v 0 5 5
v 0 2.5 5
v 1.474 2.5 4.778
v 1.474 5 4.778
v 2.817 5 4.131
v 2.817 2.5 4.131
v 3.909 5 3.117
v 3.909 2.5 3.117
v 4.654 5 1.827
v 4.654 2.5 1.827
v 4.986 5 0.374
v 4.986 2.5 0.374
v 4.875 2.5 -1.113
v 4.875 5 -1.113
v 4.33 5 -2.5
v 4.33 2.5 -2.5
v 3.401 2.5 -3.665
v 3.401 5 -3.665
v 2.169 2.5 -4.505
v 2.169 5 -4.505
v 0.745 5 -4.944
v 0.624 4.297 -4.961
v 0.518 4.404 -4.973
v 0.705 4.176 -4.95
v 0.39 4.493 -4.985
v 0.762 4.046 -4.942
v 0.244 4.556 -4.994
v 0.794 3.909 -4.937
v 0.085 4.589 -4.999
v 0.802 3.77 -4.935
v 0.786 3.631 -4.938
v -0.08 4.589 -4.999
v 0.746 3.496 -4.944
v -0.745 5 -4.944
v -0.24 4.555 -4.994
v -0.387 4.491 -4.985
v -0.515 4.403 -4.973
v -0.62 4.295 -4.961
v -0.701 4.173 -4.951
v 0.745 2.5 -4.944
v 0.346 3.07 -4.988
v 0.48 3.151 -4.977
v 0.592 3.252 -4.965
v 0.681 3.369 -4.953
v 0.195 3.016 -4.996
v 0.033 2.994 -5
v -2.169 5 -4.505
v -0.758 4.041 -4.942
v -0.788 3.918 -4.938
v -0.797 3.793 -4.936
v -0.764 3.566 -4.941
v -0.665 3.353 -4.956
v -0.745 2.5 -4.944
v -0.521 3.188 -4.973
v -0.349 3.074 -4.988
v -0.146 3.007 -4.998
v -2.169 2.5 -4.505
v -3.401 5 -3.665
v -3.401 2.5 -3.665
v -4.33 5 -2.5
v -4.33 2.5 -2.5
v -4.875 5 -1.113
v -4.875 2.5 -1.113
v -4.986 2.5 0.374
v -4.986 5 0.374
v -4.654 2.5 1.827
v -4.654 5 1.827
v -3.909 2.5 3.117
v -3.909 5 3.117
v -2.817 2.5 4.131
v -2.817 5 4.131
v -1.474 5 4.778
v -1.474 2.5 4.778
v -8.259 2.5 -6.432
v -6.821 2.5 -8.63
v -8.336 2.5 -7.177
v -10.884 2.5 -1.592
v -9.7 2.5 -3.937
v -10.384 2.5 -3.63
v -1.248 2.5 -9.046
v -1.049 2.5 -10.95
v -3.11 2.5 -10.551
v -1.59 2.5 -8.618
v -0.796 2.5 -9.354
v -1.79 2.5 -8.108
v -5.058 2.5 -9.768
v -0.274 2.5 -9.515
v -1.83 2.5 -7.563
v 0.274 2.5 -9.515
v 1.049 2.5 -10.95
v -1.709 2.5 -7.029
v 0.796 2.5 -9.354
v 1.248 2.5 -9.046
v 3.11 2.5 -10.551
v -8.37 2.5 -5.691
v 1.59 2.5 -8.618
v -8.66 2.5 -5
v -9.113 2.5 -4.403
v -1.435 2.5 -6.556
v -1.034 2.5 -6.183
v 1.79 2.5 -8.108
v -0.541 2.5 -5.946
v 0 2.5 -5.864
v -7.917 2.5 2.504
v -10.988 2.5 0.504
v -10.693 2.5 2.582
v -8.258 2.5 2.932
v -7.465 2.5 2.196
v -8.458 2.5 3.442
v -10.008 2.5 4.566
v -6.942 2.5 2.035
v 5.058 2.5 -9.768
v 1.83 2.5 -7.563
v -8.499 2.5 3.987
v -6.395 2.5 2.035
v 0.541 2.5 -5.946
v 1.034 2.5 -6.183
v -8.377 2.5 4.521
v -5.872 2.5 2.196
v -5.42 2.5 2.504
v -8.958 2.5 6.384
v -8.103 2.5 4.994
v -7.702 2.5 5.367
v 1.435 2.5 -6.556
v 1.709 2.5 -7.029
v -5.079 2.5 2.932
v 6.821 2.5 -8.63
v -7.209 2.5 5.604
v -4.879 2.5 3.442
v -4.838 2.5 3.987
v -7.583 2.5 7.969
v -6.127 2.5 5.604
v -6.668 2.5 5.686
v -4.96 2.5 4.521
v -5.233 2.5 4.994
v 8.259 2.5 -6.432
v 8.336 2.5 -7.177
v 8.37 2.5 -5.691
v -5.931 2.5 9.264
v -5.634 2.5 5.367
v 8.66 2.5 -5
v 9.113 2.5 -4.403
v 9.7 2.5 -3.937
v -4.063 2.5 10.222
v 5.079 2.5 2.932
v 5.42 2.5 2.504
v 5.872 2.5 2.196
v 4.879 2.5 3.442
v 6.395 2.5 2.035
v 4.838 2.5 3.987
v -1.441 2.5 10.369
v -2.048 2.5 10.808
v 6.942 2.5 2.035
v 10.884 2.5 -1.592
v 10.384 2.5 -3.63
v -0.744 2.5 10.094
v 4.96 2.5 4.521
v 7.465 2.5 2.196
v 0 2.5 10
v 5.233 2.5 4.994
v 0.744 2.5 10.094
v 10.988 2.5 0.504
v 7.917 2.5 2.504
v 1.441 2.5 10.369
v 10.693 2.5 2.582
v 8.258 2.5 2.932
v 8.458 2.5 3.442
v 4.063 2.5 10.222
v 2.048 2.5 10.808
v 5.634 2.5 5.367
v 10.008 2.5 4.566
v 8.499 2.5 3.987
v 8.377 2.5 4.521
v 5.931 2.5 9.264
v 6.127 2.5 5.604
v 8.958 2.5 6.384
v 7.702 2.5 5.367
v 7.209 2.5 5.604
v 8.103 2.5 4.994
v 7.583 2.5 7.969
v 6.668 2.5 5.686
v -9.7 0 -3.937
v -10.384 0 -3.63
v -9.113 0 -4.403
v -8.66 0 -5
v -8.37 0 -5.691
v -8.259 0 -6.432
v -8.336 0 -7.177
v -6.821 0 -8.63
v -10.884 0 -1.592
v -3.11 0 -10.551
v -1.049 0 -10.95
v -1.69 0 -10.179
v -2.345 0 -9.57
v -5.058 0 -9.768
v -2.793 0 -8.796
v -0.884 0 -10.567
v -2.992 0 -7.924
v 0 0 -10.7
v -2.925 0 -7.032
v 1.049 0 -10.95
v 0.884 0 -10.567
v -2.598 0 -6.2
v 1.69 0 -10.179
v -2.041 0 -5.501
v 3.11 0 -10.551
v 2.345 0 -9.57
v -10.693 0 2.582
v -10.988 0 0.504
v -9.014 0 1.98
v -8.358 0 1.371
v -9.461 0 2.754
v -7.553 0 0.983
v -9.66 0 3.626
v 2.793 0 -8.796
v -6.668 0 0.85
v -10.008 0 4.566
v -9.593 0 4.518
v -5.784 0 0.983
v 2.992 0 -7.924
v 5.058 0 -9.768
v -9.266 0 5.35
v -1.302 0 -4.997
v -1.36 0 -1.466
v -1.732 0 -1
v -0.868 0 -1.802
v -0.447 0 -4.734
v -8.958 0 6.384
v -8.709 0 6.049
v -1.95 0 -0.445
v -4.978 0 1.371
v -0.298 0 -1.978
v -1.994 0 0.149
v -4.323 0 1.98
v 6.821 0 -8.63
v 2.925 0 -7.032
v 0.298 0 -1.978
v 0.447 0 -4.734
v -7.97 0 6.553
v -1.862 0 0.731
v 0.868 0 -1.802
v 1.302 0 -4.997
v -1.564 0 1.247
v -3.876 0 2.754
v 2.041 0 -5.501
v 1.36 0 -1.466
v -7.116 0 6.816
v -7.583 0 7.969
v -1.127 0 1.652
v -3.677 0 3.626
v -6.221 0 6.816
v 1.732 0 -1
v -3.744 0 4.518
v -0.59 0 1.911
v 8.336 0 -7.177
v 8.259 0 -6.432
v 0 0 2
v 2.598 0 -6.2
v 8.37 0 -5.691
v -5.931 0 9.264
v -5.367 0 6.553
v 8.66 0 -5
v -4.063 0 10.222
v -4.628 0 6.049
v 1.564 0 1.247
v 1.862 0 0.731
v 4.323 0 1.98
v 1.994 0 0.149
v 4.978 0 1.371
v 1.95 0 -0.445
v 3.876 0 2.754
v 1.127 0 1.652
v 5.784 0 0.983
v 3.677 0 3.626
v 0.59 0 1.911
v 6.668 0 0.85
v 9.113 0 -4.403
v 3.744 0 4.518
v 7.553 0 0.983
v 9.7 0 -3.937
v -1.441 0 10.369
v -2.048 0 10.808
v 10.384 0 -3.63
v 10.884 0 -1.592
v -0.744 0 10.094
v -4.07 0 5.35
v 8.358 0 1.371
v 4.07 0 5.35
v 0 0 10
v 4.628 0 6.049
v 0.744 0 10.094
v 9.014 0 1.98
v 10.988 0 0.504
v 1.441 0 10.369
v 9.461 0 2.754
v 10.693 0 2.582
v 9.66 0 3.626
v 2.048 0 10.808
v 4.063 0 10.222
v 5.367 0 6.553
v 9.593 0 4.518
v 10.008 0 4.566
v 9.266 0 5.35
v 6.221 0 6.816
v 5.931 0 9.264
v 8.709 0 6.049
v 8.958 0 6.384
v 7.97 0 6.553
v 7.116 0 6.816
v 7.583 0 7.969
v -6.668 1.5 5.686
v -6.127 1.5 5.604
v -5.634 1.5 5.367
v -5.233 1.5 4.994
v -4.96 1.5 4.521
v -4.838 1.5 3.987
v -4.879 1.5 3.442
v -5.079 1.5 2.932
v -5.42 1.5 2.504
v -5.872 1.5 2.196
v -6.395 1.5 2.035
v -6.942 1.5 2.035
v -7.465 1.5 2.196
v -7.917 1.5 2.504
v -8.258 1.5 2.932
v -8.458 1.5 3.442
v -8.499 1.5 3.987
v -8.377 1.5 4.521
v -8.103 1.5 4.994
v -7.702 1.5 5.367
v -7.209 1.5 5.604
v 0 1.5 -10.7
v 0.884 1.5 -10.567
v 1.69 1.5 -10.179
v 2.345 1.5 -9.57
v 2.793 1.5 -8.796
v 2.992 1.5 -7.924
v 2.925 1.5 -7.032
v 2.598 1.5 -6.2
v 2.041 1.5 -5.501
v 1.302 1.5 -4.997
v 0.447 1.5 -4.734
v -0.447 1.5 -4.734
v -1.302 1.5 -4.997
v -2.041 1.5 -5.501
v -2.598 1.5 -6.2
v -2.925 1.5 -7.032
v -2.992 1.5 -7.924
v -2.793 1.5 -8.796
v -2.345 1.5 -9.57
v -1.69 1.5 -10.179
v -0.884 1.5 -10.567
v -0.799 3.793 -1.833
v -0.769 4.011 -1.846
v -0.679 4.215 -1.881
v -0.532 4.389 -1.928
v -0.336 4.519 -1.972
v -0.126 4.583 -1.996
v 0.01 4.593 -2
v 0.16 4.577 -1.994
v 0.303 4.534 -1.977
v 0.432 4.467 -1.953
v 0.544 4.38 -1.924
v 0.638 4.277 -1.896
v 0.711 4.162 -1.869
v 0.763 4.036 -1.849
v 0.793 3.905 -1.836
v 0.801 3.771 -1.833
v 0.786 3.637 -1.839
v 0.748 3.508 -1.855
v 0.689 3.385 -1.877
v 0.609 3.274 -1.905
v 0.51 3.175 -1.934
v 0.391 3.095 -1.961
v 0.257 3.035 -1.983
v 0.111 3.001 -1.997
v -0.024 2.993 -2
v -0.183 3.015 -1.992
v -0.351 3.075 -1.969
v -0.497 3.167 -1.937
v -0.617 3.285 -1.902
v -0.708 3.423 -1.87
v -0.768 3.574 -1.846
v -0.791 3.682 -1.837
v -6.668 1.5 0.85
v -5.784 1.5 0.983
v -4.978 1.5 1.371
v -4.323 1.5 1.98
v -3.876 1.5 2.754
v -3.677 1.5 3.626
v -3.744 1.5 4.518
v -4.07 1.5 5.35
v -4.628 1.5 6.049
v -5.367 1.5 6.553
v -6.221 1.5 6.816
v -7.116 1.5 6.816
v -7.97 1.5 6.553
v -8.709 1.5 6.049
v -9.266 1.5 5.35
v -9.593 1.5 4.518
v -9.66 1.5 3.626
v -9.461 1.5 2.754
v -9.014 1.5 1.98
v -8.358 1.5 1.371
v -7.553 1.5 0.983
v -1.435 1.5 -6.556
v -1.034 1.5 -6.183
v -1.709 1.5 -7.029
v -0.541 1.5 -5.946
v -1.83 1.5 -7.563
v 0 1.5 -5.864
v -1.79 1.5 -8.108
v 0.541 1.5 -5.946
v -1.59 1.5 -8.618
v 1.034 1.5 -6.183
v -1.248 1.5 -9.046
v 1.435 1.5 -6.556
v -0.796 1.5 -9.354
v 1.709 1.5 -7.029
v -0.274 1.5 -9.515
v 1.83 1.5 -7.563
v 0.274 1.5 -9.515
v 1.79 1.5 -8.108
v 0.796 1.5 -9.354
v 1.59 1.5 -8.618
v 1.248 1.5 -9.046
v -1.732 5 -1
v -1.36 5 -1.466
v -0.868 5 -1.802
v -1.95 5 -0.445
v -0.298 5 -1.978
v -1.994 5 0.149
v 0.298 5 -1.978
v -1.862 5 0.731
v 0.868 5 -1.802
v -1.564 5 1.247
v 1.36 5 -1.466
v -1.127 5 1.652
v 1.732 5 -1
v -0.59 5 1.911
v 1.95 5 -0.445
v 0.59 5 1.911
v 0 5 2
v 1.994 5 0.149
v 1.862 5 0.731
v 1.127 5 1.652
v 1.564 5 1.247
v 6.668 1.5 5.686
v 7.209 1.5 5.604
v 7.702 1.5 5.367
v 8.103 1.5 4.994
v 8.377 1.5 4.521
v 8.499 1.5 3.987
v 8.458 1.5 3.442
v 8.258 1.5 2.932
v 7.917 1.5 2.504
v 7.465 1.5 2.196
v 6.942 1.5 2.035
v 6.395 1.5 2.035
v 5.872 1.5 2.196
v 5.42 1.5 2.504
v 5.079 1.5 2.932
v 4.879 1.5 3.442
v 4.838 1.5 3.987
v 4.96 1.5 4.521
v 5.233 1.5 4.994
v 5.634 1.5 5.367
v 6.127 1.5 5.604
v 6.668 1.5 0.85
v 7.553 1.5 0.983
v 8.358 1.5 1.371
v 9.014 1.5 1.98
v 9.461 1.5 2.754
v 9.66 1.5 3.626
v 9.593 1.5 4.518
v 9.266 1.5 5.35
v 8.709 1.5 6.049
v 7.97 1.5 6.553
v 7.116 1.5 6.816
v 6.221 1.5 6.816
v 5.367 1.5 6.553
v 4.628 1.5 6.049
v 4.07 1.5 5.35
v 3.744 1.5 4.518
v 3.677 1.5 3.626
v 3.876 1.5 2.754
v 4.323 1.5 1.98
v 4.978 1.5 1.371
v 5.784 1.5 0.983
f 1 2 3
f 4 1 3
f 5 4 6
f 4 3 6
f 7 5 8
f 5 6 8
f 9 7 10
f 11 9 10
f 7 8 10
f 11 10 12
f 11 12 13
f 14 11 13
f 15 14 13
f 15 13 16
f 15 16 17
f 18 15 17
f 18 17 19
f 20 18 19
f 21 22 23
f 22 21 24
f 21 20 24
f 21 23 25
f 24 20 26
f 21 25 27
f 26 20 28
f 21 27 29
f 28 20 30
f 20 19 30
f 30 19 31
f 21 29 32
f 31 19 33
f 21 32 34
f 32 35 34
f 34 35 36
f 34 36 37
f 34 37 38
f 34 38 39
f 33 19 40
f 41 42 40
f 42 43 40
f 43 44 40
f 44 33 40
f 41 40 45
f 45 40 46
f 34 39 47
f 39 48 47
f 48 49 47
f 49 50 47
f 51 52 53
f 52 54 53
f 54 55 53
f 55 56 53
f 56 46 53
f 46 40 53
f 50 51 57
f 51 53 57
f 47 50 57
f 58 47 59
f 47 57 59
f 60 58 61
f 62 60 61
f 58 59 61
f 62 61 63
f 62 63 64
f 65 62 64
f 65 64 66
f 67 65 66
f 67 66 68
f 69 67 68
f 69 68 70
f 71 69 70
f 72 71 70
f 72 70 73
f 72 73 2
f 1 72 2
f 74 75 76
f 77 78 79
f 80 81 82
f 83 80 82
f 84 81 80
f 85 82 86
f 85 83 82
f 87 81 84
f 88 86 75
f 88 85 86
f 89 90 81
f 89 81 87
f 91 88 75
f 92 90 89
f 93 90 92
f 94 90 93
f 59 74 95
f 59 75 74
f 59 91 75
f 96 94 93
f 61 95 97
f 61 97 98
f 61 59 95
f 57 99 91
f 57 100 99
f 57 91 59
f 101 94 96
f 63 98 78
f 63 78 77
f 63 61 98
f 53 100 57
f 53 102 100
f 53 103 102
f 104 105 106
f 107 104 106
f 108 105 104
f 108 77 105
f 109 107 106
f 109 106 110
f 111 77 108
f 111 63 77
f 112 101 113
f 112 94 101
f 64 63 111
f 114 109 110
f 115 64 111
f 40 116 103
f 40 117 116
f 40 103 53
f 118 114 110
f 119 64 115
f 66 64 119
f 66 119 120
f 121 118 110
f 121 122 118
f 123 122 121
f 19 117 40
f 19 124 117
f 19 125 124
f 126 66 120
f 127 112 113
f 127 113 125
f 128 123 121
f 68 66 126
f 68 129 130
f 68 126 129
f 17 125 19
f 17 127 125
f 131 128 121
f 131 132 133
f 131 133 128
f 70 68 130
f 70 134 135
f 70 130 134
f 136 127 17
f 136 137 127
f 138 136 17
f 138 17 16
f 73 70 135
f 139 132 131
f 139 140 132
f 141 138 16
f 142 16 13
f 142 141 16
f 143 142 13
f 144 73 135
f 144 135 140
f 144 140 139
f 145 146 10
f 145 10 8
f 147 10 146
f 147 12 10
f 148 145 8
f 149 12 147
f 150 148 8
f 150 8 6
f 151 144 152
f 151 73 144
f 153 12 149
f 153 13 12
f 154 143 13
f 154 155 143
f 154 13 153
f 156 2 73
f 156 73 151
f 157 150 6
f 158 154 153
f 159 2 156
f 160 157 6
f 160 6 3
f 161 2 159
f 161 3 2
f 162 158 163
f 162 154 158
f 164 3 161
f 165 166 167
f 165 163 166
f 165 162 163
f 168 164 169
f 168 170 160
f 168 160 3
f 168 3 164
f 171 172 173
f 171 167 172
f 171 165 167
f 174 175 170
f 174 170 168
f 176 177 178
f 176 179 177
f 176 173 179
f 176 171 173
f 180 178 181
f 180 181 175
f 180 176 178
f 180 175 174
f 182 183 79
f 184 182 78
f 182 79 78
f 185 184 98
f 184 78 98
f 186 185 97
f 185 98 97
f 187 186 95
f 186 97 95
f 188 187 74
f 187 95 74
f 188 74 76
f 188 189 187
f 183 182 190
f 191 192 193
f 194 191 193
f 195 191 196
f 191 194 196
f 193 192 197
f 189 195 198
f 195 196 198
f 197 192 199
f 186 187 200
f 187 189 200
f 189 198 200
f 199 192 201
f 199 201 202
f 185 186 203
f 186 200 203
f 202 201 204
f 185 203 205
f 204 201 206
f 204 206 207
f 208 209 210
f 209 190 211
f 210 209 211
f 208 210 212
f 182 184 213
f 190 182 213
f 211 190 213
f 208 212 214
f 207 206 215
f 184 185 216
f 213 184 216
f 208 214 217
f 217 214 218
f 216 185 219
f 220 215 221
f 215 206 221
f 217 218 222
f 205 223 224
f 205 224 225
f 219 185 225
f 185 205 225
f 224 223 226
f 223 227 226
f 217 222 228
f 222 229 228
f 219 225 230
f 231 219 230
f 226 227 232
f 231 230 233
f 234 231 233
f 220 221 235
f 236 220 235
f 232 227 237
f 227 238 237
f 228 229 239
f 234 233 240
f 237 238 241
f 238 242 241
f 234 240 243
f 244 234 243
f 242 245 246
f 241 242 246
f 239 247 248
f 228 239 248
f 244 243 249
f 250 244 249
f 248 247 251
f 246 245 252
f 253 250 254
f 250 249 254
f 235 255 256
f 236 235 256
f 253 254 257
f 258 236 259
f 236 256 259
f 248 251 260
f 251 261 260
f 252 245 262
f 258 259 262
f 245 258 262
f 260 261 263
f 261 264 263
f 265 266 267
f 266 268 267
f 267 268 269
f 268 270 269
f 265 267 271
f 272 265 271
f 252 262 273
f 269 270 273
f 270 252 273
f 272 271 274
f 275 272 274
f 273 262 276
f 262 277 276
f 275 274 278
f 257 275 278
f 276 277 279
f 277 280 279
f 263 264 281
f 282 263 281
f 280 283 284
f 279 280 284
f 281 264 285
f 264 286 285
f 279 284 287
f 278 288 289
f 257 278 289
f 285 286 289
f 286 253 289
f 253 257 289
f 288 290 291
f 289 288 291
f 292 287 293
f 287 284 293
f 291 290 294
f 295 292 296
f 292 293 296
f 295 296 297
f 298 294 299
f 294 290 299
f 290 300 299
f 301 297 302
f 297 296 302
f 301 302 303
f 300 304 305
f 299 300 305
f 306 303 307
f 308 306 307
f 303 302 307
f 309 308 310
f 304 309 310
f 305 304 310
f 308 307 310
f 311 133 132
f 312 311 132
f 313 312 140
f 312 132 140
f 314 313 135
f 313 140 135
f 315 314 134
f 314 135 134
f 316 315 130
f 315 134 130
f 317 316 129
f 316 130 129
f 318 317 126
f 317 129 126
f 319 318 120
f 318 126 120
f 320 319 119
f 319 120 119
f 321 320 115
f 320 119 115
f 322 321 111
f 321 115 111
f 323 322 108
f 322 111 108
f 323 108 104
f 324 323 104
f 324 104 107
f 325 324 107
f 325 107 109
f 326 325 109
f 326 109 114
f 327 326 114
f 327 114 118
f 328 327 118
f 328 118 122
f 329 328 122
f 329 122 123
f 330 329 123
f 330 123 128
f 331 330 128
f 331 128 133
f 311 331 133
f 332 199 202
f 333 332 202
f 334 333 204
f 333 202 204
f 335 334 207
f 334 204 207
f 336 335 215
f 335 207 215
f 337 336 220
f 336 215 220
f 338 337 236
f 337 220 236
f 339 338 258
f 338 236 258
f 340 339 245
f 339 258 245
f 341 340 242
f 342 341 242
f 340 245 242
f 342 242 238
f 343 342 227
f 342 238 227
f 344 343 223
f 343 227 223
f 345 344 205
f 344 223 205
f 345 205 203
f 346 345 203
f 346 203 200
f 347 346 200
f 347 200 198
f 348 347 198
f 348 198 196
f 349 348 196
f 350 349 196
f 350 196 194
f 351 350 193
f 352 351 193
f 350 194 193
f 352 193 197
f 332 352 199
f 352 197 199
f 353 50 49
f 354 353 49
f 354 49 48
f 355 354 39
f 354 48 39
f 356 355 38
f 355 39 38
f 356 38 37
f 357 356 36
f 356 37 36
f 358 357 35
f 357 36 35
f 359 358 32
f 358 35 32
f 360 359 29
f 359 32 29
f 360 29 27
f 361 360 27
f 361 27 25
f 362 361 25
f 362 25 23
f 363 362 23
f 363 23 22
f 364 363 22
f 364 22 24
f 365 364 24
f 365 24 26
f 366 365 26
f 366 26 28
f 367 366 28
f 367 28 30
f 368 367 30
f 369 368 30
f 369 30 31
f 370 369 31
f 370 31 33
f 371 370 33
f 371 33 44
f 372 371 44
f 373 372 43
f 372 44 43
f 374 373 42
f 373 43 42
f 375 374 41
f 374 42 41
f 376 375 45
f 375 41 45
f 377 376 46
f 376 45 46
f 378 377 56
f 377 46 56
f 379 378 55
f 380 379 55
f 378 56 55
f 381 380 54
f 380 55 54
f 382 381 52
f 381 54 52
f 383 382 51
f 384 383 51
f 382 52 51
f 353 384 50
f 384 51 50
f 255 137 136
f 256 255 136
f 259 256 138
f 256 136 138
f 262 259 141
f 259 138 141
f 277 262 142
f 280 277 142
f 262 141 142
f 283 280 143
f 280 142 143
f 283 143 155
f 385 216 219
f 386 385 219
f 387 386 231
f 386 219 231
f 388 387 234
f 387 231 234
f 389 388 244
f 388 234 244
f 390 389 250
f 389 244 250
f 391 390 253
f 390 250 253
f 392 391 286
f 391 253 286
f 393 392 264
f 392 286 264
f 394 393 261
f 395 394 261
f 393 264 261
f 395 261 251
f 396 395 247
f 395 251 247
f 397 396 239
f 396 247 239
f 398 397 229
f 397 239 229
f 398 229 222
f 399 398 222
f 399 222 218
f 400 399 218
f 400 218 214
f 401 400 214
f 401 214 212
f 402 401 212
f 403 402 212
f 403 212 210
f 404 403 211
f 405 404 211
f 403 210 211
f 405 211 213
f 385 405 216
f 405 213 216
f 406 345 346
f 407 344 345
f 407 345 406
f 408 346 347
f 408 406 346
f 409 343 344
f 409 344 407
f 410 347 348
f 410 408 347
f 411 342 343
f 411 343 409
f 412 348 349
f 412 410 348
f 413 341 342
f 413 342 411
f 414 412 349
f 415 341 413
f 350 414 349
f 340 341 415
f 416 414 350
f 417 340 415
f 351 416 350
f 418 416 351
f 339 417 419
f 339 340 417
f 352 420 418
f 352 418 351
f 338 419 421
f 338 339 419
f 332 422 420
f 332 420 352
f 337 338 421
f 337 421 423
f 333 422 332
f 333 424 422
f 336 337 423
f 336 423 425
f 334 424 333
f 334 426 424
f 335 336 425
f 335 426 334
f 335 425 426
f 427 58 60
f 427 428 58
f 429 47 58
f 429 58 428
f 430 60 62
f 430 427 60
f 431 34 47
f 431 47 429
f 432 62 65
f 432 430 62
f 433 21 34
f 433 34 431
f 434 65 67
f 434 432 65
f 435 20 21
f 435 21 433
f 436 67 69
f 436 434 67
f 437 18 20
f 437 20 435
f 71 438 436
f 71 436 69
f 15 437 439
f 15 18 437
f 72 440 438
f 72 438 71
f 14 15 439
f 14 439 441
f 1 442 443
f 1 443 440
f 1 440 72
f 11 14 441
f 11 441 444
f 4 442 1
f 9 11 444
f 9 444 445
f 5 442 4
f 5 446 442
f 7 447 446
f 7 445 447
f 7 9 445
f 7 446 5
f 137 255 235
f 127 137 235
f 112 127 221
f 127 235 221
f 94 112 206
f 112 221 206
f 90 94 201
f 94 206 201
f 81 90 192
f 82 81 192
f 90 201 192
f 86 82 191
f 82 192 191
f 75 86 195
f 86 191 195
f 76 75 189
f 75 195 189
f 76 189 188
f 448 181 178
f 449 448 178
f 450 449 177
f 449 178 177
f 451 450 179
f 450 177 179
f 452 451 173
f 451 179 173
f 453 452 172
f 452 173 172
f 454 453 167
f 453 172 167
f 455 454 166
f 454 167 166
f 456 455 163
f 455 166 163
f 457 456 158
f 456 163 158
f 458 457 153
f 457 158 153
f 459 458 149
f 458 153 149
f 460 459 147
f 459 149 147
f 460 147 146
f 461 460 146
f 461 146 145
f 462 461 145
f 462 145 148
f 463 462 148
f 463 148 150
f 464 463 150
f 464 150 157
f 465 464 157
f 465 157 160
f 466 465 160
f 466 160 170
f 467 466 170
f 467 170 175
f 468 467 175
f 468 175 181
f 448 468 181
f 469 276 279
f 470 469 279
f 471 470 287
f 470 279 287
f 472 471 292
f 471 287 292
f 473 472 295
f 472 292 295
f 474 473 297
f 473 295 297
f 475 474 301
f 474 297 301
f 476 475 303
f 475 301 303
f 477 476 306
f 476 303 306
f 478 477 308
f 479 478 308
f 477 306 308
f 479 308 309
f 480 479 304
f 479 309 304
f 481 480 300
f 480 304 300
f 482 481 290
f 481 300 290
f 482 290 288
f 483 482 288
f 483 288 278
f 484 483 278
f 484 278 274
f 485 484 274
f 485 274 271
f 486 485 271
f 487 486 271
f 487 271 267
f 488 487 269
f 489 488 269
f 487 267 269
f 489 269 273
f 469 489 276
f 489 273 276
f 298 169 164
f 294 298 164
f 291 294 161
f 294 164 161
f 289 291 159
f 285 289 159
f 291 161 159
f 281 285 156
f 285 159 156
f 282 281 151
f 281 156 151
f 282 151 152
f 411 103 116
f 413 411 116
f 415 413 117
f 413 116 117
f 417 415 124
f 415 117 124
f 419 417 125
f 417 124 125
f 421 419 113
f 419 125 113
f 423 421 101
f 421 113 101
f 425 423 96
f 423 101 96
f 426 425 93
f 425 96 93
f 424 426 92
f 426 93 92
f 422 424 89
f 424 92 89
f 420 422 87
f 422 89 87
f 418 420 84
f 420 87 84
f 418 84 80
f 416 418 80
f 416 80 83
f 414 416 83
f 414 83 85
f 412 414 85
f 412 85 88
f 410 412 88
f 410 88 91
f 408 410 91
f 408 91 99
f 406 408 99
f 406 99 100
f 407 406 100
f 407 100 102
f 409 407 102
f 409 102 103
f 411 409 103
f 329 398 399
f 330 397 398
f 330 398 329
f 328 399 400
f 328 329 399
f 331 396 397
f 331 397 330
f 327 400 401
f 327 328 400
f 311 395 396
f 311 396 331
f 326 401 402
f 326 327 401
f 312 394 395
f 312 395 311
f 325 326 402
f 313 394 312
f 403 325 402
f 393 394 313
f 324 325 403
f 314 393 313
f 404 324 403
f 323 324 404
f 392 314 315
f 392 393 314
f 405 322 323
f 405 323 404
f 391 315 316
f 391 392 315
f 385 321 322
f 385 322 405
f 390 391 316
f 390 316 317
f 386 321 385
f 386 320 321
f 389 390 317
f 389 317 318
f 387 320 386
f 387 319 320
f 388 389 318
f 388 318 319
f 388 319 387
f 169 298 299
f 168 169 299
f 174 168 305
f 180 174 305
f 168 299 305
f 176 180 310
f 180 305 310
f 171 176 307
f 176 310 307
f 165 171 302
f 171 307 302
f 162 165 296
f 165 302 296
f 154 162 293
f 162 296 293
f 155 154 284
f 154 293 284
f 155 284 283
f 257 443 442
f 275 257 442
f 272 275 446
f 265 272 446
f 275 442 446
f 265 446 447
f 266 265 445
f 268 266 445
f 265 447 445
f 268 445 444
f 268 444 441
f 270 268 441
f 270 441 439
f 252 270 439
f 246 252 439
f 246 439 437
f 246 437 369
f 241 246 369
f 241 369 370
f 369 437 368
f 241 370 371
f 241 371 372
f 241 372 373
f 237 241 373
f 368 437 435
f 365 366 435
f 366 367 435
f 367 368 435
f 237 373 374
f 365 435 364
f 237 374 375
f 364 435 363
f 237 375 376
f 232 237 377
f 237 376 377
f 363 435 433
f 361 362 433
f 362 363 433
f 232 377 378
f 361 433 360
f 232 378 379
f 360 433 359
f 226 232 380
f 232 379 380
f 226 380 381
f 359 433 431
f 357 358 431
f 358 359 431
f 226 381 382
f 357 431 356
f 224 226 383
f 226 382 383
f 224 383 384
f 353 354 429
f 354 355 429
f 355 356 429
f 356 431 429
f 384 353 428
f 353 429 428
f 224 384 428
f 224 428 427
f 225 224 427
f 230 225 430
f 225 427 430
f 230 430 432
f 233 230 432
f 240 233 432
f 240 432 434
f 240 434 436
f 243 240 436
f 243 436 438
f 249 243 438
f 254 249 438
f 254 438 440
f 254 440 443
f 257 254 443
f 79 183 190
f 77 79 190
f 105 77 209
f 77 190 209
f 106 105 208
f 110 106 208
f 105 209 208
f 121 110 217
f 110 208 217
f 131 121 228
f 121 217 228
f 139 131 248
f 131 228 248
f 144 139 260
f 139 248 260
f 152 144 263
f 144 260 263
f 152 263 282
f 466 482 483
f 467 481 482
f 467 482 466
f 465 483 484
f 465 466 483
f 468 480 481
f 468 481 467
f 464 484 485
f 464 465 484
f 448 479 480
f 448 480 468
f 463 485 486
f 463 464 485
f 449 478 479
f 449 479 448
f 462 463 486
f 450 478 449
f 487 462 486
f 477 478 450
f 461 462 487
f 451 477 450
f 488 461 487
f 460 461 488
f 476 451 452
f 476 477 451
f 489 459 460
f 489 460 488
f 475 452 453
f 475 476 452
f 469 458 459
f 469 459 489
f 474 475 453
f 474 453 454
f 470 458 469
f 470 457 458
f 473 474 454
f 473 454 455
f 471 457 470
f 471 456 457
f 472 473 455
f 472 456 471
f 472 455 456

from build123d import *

# Parameters (mm, degrees)
ESBO_O1_R                                      = 11
RESSALTO_EXTRUS_O1_DEPTH                       = 2.5
ESBO_O3_R                                      = 1.835521505
CORTE_EXTRUS_O1_DEPTH                          = 2.5
ESBO_O18_R                                     = 5
RESSALTO_EXTRUS_O5_DEPTH                       = 2.5
ESBO_O20_R                                     = 2
CORTE_EXTRUS_O5_DEPTH                          = 5.5
BROCA_DE_ROSQUEAR_PARA_TARRAXA_DE_M2X0_4_REACH = 21.785
BROCA_DE_ROSQUEAR_PARA_TARRAXA_DE_M2_2_R       = 0.8
ESBO_O22_R                                     = 3
CORTE_EXTRUS_O6_DEPTH                          = 5.5
ESBO_O23_R                                     = 3
CORTE_EXTRUS_O7_DEPTH                          = 1.5


with BuildPart() as part:
    # Esboço1 → Ressalto-extrusão1 (new body)
    with BuildSketch(Plane(origin=(0, 0, 0), x_dir=(1, 0, 0), z_dir=(0, 1, 0))):
        with Locations(Location((0, 0, 0), (0, 0, 270))):
            Circle(ESBO_O1_R)
    extrude(amount=RESSALTO_EXTRUS_O1_DEPTH)

    # Esboço3 → Corte-extrusão1 (cut)
    with BuildSketch(Plane(origin=(0, 2.5, 0), x_dir=(1, 0, 0), z_dir=(0, 1, 0))):
        with Locations(Location((0, 7.7, 0), (0, 0, 270))):
            Circle(ESBO_O3_R)
        with Locations(Location((6.668395609, -3.85, 0), (0, 0, 270))):
            Circle(ESBO_O3_R)
        with Locations(Location((-6.668395609, -3.85, 0), (0, 0, 270))):
            Circle(ESBO_O3_R)
    extrude(amount=-CORTE_EXTRUS_O1_DEPTH, mode=Mode.SUBTRACT)

    # Esboço18 → Ressalto-extrusão5 (add)
    with BuildSketch(Plane(origin=(0, 2.5, 0), x_dir=(1, 0, 0), z_dir=(0, 1, 0))):
        with Locations(Location((0, 0, 0), (0, 0, 270))):
            Circle(ESBO_O18_R)
    extrude(amount=RESSALTO_EXTRUS_O5_DEPTH)

    # Esboço20 → Corte-extrusão5 (cut)
    with BuildSketch(Plane(origin=(0, 5, 0), x_dir=(1, 0, 0), z_dir=(0, 1, 0))):
        with Locations(Location((0, 0, 0), (0, 0, 270))):
            Circle(ESBO_O20_R)
    extrude(amount=-CORTE_EXTRUS_O5_DEPTH, mode=Mode.SUBTRACT)

    # Broca de rosquear para tarraxa de M2 2 (on position points) → Broca de rosquear para tarraxa de M2x0.41 (cut, up to next)
    with BuildSketch(Plane(origin=(0.002598781, 3.792959438, -4.999999325), x_dir=(-0.999999864927, 0, -0.000519756122), z_dir=(0.000519756122, 0, -0.999999864927)), mode=Mode.PRIVATE) as broca_de_rosquear_para_tarraxa_de_m2x0_4_sk1:
        Circle(BROCA_DE_ROSQUEAR_PARA_TARRAXA_DE_M2_2_R)
    broca_de_rosquear_para_tarraxa_de_m2x0_4_tool1 = extrude(broca_de_rosquear_para_tarraxa_de_m2x0_4_sk1.sketch, amount=-BROCA_DE_ROSQUEAR_PARA_TARRAXA_DE_M2X0_4_REACH, mode=Mode.PRIVATE) & part.part
    add(broca_de_rosquear_para_tarraxa_de_m2x0_4_tool1.solids().sort_by_distance((0.002599, 3.792959, -4.999999))[0], mode=Mode.SUBTRACT)

    # Esboço22 → Corte-extrusão6 (cut)
    with BuildSketch(Plane(origin=(0, 2.5, 0), x_dir=(1, 0, 0), z_dir=(0, 1, 0))):
        with Locations((-11.258330249, 6.5)):
            Circle(ESBO_O22_R)
        with Locations((0, -13)):
            Circle(ESBO_O22_R)
        with Locations((11.258330249, 6.5)):
            Circle(ESBO_O22_R)
    extrude(amount=-CORTE_EXTRUS_O6_DEPTH, mode=Mode.SUBTRACT)

    # Esboço23 → Corte-extrusão7 (cut)
    with BuildSketch(Plane(origin=(0, 0, 0), x_dir=(-1, 0, 0), z_dir=(0, -1, 0))):
        with Locations(Location((-6.668395609, -3.85, 0), (0, 0, 90))):
            Circle(ESBO_O23_R)
        with Locations(Location((6.668395609, -3.85, 0), (0, 0, 90))):
            Circle(ESBO_O23_R)
        with Locations(Location((0, 7.7, 0), (0, 0, 90))):
            Circle(ESBO_O23_R)
    extrude(amount=-CORTE_EXTRUS_O7_DEPTH, mode=Mode.SUBTRACT)


solid = part.part
